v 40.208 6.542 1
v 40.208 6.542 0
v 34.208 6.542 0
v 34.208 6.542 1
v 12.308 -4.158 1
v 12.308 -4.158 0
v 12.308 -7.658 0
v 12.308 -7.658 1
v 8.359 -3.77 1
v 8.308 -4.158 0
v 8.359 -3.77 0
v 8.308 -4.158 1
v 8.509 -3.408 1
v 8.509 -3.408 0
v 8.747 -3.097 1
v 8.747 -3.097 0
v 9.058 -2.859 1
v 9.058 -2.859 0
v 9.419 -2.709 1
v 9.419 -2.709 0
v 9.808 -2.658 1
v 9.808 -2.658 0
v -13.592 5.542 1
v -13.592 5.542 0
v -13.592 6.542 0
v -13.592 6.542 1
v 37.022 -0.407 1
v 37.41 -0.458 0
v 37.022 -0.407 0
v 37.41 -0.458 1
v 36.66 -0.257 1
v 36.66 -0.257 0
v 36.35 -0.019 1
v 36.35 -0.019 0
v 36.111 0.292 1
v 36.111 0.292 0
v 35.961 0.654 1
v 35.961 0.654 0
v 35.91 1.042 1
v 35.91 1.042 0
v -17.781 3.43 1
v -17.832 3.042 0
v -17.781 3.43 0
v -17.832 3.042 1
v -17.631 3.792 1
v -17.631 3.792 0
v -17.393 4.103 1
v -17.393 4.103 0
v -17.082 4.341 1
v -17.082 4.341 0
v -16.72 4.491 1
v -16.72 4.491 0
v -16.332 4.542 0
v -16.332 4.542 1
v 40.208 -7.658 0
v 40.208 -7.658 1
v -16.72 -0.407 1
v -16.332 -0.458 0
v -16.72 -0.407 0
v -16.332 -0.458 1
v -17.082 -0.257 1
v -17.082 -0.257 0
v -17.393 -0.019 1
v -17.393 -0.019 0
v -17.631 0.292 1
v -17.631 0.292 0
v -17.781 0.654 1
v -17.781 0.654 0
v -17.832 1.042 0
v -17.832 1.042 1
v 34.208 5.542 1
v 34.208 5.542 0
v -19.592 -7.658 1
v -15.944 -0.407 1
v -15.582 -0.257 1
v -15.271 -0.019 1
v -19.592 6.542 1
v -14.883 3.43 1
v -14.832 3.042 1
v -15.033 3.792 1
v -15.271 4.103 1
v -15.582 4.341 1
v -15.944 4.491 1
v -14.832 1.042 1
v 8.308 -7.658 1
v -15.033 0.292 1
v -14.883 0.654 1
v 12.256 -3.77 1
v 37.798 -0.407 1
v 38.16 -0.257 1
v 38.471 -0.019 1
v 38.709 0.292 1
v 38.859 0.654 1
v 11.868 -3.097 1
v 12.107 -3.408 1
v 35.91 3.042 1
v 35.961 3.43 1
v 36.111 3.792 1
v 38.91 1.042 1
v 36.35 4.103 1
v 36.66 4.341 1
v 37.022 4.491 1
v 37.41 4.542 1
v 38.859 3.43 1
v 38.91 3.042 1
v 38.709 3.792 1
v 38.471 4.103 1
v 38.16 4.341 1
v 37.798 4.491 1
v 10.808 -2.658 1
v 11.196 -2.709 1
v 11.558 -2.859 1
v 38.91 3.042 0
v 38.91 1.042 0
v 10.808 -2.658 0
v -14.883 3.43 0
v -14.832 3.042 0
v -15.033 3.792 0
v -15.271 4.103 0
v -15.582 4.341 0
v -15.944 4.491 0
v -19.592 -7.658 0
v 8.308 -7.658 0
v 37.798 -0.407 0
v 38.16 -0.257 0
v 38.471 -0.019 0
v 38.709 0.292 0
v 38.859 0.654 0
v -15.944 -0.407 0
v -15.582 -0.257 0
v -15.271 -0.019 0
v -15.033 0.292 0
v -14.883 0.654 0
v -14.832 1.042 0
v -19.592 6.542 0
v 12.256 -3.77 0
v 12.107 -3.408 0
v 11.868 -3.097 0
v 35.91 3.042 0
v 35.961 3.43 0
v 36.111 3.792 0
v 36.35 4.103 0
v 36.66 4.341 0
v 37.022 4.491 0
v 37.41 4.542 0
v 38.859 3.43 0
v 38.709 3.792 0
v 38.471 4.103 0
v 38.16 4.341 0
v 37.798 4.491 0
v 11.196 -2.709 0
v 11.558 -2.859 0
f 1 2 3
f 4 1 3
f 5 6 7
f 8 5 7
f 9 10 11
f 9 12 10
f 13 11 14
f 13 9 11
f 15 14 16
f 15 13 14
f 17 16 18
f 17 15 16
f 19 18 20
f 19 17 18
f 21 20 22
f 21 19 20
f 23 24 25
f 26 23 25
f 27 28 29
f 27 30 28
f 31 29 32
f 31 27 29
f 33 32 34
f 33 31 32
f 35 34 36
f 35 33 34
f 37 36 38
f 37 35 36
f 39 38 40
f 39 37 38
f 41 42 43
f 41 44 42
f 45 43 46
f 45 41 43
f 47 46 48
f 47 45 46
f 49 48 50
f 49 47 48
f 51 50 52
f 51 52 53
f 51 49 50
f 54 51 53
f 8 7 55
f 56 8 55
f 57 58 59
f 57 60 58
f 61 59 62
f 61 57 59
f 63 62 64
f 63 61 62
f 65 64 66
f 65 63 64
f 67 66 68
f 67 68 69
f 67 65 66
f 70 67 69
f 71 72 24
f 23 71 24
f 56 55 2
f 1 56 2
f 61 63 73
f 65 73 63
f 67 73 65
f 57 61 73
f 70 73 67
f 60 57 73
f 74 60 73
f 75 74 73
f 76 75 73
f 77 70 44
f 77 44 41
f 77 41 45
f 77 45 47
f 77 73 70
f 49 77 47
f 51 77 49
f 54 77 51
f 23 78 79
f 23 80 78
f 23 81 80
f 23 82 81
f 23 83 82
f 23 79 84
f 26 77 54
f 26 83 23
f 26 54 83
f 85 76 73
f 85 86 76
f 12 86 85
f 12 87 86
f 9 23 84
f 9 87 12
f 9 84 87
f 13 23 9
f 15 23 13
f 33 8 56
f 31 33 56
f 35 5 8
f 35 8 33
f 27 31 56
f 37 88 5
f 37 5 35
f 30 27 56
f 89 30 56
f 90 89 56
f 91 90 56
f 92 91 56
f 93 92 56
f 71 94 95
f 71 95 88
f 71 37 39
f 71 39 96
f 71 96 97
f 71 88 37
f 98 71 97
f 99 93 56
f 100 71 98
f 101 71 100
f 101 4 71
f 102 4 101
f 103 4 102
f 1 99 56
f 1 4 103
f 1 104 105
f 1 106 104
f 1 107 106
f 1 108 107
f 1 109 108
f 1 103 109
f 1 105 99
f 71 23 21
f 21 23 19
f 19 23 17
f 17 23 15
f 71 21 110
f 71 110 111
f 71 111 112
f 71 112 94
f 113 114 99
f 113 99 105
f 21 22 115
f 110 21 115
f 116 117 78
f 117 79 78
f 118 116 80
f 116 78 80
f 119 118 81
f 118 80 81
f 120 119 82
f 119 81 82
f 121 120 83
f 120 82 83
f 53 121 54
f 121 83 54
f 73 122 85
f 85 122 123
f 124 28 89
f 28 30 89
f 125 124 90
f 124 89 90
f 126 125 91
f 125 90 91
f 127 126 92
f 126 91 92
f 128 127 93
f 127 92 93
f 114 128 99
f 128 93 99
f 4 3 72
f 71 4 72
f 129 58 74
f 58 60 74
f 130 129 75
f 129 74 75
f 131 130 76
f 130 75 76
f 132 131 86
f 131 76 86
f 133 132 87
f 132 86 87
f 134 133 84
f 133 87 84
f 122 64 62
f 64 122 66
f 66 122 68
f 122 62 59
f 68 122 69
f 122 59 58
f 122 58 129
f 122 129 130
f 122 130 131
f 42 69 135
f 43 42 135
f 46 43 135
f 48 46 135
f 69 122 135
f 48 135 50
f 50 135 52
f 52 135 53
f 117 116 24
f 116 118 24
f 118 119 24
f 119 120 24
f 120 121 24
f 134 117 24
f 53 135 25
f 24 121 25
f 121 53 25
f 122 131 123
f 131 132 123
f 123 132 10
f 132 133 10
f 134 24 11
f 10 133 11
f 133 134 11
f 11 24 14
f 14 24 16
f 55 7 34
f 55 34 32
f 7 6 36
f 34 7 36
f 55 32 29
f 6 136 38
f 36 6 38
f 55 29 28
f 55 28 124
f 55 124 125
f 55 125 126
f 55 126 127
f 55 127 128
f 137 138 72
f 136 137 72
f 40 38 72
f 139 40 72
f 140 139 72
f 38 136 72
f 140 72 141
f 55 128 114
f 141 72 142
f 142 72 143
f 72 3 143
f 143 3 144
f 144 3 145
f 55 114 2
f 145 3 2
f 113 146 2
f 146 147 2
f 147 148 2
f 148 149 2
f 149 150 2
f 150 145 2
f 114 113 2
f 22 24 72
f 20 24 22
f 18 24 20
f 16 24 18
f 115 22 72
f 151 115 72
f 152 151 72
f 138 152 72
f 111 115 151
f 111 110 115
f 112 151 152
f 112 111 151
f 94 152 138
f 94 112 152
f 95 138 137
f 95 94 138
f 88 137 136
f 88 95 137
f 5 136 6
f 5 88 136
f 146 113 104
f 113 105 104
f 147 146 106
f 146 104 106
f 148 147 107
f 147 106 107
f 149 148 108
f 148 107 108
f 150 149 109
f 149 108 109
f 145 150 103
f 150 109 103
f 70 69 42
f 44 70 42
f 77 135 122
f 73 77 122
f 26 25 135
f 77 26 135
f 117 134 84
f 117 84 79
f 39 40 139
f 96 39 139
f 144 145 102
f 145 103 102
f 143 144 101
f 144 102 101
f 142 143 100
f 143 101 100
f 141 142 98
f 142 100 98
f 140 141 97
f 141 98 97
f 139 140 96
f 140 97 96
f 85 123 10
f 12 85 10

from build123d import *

# Parameters (mm, degrees)
F0_W     = 3
F0_H     = 5
F1_DEPTH = 1
F2_R     = 1.49999
F3_R     = 1.5


# Not quite as in the source:
# - a fillet or chamfer is up to 0.001 mm smaller than in the source, because OpenCascade refuses the exact size


with BuildPart() as f1:
    # F0 (on Top) → F1 (new body)
    with BuildSketch(Plane.XY):
        Polygon((-13.5924067289, 6.5421499412), (-19.5924067289, 6.5421499412), (-19.5924067289, -7.6578500588), (8.3075932711, -7.6578500588), (8.3075932711, -2.6578500588), (12.3075932711, -2.6578500588), (12.3075932711, -7.6578500588), (40.2075932711, -7.6578500588), (40.2075932711, 6.5421499412), (34.2075932711, 6.5421499412), (34.2075932711, 5.5421499412), (-13.5924067289, 5.5421499412), align=None)
        with Locations((-16.332133919, 2.0421499412)):
            Rectangle(F0_W, F0_H, mode=Mode.SUBTRACT)
        with Locations((37.4102636576, 2.0421499412)):
            Rectangle(F0_W, F0_H, mode=Mode.SUBTRACT)
    extrude(amount=F1_DEPTH)

    # F2 (radius 1.5 in the source; OpenCascade refuses exactly that, so slightly less here)
    f2_edges = [f1.edges().sort_by_distance(p)[0] for p in [
        (-17.832134, 4.54215, 0.5),
        (-14.832134, 4.54215, 0.5),
        (-14.832134, -0.45785, 0.5),
        (-17.832134, -0.45785, 0.5),
        (38.910264, 4.54215, 0.5),
        (35.910264, 4.54215, 0.5),
        (35.910264, -0.45785, 0.5),
        (38.910264, -0.45785, 0.5),
    ]]
    fillet(f2_edges, radius=F2_R)

    # F3
    f3_edges = [f1.edges().sort_by_distance(p)[0] for p in [
        (8.307593, -2.65785, 0.5),
        (12.307593, -2.65785, 0.5),
    ]]
    fillet(f3_edges, radius=F3_R)


solid = f1.part
